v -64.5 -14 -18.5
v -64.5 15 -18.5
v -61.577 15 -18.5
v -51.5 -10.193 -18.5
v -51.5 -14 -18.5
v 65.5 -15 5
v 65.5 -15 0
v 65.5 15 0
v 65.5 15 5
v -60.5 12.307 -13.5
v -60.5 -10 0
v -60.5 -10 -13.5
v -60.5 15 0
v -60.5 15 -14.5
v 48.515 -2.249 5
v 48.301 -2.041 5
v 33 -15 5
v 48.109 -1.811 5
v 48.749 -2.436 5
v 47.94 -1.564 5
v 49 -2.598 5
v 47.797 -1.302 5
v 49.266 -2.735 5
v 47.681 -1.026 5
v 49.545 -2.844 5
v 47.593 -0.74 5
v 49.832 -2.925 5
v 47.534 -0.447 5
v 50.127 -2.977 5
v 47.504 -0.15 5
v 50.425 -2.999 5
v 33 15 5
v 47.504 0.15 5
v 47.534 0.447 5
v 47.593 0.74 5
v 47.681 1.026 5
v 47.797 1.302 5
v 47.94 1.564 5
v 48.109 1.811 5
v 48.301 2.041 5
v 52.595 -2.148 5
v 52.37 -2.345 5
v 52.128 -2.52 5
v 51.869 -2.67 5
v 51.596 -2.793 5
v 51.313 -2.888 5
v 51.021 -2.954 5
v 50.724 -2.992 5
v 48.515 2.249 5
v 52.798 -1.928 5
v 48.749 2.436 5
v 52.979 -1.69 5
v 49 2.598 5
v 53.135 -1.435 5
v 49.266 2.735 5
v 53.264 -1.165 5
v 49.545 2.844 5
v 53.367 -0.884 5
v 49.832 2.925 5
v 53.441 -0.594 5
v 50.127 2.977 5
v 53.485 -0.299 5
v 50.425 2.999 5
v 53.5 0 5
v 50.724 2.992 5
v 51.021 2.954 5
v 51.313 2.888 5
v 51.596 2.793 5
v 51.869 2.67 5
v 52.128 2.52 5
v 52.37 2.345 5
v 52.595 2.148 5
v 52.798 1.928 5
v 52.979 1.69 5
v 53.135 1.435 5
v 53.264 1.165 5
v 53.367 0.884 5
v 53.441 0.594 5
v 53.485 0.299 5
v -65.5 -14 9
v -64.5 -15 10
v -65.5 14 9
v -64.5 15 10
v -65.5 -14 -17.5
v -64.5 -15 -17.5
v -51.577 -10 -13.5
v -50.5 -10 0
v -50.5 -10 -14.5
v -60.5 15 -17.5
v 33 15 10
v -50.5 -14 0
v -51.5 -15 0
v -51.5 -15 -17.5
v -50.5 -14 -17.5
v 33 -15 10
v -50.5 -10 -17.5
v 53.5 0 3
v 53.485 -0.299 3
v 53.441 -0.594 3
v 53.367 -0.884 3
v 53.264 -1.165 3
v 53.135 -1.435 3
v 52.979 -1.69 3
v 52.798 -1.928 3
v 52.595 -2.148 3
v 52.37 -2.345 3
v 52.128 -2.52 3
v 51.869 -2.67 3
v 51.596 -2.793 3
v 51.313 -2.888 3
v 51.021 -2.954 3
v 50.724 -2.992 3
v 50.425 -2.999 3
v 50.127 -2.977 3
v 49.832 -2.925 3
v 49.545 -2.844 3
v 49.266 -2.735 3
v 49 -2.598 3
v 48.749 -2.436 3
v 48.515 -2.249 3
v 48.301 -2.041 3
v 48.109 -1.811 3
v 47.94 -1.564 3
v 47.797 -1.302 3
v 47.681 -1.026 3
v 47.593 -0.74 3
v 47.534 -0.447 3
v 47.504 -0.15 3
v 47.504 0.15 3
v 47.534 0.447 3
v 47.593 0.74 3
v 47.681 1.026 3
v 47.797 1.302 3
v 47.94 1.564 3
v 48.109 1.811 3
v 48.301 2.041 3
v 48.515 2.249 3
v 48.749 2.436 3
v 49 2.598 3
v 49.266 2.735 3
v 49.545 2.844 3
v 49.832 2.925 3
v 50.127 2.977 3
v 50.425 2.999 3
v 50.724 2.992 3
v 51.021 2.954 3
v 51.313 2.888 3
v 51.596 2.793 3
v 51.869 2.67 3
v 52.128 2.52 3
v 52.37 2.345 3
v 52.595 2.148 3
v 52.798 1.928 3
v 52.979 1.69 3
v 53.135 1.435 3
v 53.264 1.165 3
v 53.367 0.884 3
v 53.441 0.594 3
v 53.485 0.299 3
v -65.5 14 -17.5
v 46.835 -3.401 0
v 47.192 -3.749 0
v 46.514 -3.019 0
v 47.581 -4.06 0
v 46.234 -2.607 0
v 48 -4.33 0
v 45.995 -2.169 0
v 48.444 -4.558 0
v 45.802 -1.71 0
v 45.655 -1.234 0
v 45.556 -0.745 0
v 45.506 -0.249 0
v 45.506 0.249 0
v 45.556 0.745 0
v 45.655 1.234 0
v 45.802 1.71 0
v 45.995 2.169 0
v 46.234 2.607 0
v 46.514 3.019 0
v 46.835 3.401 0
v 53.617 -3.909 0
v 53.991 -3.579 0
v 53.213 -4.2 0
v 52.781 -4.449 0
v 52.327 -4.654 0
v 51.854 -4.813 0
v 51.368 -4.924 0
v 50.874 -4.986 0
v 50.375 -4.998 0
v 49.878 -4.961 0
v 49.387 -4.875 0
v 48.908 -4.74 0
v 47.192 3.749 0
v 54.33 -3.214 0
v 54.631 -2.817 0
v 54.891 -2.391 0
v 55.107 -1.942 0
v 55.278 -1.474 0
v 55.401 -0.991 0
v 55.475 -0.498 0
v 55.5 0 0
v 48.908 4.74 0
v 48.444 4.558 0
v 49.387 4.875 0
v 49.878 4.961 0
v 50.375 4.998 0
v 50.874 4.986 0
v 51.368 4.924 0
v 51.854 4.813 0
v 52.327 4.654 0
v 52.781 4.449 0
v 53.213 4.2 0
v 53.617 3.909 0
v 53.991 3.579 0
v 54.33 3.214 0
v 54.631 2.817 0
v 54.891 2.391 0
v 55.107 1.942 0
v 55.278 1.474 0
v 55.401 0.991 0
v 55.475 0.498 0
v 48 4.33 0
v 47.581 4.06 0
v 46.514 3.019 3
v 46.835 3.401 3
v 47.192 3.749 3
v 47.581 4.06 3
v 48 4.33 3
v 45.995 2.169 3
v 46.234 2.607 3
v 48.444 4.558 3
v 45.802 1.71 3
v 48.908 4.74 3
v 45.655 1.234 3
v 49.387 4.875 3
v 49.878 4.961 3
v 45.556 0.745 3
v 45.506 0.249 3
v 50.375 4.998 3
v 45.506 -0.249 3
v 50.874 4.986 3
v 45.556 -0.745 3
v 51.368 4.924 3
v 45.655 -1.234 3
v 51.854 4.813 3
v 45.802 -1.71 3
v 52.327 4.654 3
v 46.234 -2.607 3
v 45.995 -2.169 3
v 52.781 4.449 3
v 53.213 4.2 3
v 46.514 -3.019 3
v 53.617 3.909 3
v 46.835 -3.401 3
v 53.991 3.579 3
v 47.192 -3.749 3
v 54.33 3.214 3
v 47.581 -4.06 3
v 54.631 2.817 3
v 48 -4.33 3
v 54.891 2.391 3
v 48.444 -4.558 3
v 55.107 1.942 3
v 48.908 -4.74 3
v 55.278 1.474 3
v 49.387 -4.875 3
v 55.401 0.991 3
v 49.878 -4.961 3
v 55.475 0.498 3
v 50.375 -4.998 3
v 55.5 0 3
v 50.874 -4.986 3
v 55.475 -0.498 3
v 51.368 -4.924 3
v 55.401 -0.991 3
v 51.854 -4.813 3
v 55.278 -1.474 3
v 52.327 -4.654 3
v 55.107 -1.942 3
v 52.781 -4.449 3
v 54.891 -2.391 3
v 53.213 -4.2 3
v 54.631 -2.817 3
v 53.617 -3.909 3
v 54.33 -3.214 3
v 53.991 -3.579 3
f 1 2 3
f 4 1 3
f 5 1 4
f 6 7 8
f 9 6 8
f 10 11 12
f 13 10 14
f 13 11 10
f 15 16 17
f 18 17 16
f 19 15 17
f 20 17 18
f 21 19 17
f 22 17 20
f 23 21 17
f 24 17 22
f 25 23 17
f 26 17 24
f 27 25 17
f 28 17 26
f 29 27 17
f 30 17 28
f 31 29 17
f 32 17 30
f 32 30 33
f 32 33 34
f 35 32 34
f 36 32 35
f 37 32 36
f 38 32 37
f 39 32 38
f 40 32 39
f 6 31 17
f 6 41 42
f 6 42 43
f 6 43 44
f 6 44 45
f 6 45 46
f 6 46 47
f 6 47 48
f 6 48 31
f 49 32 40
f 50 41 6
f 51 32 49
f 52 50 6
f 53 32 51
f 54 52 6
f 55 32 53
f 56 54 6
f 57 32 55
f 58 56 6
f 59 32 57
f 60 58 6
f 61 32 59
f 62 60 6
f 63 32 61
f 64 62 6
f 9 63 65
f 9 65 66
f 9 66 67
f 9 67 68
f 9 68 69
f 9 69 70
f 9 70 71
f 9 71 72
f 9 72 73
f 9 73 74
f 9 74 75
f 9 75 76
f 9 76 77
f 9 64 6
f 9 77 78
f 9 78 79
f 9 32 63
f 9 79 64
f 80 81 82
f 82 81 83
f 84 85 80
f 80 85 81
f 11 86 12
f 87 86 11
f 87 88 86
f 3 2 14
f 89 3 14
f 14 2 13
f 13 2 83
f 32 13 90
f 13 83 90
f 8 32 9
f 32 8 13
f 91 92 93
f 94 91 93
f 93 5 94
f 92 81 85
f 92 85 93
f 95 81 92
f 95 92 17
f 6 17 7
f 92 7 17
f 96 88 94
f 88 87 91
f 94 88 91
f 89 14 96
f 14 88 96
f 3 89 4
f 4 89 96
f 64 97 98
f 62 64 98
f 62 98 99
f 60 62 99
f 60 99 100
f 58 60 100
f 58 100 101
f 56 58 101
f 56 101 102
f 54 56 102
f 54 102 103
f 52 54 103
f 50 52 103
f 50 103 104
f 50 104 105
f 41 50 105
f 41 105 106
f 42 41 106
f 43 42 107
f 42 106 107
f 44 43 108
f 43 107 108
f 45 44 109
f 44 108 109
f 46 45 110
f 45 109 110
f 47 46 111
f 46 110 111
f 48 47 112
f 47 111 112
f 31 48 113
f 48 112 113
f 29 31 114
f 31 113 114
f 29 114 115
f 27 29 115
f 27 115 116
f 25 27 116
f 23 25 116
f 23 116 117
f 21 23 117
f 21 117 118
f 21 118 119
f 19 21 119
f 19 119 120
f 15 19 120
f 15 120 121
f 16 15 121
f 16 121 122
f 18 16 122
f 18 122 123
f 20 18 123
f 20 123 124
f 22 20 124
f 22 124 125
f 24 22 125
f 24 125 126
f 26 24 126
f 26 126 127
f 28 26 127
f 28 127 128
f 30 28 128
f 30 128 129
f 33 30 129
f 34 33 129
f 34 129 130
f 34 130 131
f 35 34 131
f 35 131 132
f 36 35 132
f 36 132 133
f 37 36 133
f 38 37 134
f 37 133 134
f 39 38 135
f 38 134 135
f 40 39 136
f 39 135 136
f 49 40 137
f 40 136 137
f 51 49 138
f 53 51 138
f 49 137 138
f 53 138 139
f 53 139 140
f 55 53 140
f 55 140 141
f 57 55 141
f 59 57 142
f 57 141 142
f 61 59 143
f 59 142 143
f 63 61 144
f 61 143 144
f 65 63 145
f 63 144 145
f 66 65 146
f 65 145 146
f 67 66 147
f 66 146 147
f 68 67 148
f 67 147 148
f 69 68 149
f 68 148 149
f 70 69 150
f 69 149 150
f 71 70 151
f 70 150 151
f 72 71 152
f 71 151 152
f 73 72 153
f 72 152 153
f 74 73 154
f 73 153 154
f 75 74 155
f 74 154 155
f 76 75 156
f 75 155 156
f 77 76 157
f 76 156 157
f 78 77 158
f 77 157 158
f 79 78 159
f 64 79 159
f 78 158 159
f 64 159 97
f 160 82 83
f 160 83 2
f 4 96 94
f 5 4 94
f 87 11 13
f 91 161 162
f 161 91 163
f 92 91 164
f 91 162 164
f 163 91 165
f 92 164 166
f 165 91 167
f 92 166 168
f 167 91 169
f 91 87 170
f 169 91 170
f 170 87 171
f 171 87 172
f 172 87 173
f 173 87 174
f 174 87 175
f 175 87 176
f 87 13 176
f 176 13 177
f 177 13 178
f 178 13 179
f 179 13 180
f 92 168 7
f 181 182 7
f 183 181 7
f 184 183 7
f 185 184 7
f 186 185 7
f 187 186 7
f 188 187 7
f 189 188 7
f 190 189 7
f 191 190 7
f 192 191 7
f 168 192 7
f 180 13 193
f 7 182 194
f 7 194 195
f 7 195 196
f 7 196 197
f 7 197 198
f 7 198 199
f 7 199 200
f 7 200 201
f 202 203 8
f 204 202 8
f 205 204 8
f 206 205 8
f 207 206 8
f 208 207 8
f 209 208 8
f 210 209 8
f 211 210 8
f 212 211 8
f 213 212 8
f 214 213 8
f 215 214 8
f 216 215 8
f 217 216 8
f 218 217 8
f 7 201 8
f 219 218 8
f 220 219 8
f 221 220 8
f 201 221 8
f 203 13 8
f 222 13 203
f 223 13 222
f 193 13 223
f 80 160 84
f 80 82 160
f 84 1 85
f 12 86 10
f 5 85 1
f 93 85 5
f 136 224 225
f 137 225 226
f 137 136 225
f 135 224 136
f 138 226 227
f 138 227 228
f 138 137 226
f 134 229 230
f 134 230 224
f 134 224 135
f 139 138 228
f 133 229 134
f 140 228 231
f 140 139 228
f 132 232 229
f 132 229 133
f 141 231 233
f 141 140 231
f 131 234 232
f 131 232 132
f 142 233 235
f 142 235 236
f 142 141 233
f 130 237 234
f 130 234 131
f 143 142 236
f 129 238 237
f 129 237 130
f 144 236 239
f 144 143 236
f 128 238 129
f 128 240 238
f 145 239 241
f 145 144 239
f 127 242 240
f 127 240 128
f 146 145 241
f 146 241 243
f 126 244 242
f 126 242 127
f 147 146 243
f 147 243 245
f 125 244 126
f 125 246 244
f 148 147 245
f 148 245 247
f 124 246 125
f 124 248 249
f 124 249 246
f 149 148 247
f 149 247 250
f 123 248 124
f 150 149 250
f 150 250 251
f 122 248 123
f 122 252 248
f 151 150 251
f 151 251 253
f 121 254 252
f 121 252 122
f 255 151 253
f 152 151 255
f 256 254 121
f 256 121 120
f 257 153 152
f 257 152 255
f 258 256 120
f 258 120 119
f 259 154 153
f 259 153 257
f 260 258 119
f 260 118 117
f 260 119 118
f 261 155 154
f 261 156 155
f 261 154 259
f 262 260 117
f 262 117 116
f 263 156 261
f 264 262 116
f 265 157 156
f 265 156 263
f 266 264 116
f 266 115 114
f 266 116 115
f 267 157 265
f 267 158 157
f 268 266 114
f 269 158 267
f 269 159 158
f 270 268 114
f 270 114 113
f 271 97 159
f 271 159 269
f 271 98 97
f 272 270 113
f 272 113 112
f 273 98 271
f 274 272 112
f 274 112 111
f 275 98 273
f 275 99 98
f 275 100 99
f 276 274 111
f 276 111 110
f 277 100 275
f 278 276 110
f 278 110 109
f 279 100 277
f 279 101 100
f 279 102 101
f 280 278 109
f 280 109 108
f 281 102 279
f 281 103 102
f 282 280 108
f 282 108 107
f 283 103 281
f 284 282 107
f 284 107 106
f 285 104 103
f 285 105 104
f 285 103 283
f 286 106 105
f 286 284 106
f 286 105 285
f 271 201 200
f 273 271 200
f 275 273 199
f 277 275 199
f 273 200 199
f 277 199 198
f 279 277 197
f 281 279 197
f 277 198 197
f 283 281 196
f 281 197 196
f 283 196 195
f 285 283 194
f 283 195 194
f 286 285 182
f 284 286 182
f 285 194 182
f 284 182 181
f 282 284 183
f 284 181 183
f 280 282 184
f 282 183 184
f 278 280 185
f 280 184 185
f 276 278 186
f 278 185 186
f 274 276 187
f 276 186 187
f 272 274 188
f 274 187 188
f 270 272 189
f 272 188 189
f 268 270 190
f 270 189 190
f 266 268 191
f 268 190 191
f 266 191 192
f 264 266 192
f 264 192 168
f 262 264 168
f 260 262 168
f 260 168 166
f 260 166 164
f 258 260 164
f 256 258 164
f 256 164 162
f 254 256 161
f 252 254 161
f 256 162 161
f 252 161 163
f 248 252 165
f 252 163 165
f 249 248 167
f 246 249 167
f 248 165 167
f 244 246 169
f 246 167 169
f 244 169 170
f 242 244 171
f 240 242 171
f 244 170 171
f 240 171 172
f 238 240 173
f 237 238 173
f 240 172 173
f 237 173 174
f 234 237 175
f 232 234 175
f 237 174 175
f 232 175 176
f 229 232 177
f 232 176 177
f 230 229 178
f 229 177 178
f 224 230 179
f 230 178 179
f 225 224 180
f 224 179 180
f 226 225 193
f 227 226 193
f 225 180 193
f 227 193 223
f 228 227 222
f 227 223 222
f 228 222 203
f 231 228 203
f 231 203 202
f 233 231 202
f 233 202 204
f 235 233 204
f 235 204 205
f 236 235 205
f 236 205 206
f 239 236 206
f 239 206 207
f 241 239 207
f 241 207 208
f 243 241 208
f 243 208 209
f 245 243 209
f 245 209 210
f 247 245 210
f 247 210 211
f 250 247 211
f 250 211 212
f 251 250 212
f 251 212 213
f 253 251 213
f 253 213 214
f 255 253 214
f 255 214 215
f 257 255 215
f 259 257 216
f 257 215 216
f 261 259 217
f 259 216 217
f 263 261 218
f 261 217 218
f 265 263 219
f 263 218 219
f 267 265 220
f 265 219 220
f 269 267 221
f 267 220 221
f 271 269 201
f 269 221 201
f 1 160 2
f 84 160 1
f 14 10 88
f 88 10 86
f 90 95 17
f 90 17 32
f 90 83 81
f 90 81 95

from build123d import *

# Parameters (mm, degrees)
SKETCH022_W      = 131
SKETCH022_H      = 30
PAD007_DEPTH     = 10
SKETCH021_W      = 15
SKETCH021_H      = 30
PAD008_DEPTH     = 18.5
SKETCH023_W      = 25
SKETCH023_H      = 13.5
POCKET014_DEPTH  = 10
SKETCH020_R      = 3
POCKET015_DEPTH  = 10.001
SKETCH024_W      = 32.5
SKETCH024_H      = 30
POCKET016_DEPTH  = 5
SKETCH037_R      = 5
POCKET025_DEPTH  = 3
CHAMFER004_SIZE2 = 25
CHAMFER004_SIZE  = 10
CHAMFER005_SIZE  = 1


with BuildPart() as part:
    # Sketch022 → Pad007 (new body)
    with BuildSketch(Plane.XY):
        Rectangle(SKETCH022_W, SKETCH022_H)
    extrude(amount=PAD007_DEPTH)

    # Sketch021 (on Face5 of Pad007) → Pad008 (join)
    with BuildSketch(Plane(origin=(0, 0, 0), x_dir=(1, 0, 0), z_dir=(0, 0, -1))):
        with Locations((-58, 0)):
            Rectangle(SKETCH021_W, SKETCH021_H)
    extrude(amount=PAD008_DEPTH)

    # Sketch023 (on Face9 of Pad008) → Pocket014 (cut)
    with BuildSketch(Plane.YZ.offset(-50.5)):
        with Locations((2.5, -6.75)):
            Rectangle(SKETCH023_W, SKETCH023_H)
    extrude(amount=-POCKET014_DEPTH, mode=Mode.SUBTRACT)

    # Sketch020 (on Face5 of Pocket014) → Pocket015 (cut, through all)
    with BuildSketch(Plane(origin=(0, 0, 0), x_dir=(1, 0, 0), z_dir=(0, 0, -1))):
        with Locations((50.5, 0)):
            Circle(SKETCH020_R)
    extrude(amount=-POCKET015_DEPTH, mode=Mode.SUBTRACT)

    # Sketch024 → Pocket016 (cut)
    with BuildSketch(Plane.XY.offset(10)):
        with Locations((49.25, 0)):
            Rectangle(SKETCH024_W, SKETCH024_H)
    extrude(amount=-POCKET016_DEPTH, mode=Mode.SUBTRACT)

    # Sketch037 (on Face4 of Pocket016) → Pocket025 (cut)
    with BuildSketch(Plane(origin=(0, 0, 0), x_dir=(1, 0, 0), z_dir=(0, 0, -1))):
        with Locations((50.5, 0)):
            Circle(SKETCH037_R)
    extrude(amount=-POCKET025_DEPTH, mode=Mode.SUBTRACT)

    # Chamfer004
    chamfer004_edges = [part.edges().sort_by_distance(p)[0] for p in [
        (-50.5, 15, -16),
    ]]
    chamfer004_side = part.faces().sort_by_distance((-55.5, 15, -13.73817))[0]
    chamfer(chamfer004_edges, length=CHAMFER004_SIZE, length2=CHAMFER004_SIZE2, reference=chamfer004_side)

    # Chamfer005
    chamfer005_edges = [part.edges().sort_by_distance(p)[0] for p in [
        (-55.5, 2.5, -18.5),
        (-55.5, 2.5, -13.5),
        (-50.5, -12.5, -18.5),
        (-58, -15, -18.5),
        (-50.5, -15, -9.25),
        (-65.5, 0, -18.5),
        (-65.5, 15, -9.25),
        (-65.5, 15, 5),
        (-65.5, 0, 10),
        (-65.5, -15, 5),
        (-65.5, -15, -9.25),
    ]]
    chamfer(chamfer005_edges, length=CHAMFER005_SIZE)


solid = part.part
